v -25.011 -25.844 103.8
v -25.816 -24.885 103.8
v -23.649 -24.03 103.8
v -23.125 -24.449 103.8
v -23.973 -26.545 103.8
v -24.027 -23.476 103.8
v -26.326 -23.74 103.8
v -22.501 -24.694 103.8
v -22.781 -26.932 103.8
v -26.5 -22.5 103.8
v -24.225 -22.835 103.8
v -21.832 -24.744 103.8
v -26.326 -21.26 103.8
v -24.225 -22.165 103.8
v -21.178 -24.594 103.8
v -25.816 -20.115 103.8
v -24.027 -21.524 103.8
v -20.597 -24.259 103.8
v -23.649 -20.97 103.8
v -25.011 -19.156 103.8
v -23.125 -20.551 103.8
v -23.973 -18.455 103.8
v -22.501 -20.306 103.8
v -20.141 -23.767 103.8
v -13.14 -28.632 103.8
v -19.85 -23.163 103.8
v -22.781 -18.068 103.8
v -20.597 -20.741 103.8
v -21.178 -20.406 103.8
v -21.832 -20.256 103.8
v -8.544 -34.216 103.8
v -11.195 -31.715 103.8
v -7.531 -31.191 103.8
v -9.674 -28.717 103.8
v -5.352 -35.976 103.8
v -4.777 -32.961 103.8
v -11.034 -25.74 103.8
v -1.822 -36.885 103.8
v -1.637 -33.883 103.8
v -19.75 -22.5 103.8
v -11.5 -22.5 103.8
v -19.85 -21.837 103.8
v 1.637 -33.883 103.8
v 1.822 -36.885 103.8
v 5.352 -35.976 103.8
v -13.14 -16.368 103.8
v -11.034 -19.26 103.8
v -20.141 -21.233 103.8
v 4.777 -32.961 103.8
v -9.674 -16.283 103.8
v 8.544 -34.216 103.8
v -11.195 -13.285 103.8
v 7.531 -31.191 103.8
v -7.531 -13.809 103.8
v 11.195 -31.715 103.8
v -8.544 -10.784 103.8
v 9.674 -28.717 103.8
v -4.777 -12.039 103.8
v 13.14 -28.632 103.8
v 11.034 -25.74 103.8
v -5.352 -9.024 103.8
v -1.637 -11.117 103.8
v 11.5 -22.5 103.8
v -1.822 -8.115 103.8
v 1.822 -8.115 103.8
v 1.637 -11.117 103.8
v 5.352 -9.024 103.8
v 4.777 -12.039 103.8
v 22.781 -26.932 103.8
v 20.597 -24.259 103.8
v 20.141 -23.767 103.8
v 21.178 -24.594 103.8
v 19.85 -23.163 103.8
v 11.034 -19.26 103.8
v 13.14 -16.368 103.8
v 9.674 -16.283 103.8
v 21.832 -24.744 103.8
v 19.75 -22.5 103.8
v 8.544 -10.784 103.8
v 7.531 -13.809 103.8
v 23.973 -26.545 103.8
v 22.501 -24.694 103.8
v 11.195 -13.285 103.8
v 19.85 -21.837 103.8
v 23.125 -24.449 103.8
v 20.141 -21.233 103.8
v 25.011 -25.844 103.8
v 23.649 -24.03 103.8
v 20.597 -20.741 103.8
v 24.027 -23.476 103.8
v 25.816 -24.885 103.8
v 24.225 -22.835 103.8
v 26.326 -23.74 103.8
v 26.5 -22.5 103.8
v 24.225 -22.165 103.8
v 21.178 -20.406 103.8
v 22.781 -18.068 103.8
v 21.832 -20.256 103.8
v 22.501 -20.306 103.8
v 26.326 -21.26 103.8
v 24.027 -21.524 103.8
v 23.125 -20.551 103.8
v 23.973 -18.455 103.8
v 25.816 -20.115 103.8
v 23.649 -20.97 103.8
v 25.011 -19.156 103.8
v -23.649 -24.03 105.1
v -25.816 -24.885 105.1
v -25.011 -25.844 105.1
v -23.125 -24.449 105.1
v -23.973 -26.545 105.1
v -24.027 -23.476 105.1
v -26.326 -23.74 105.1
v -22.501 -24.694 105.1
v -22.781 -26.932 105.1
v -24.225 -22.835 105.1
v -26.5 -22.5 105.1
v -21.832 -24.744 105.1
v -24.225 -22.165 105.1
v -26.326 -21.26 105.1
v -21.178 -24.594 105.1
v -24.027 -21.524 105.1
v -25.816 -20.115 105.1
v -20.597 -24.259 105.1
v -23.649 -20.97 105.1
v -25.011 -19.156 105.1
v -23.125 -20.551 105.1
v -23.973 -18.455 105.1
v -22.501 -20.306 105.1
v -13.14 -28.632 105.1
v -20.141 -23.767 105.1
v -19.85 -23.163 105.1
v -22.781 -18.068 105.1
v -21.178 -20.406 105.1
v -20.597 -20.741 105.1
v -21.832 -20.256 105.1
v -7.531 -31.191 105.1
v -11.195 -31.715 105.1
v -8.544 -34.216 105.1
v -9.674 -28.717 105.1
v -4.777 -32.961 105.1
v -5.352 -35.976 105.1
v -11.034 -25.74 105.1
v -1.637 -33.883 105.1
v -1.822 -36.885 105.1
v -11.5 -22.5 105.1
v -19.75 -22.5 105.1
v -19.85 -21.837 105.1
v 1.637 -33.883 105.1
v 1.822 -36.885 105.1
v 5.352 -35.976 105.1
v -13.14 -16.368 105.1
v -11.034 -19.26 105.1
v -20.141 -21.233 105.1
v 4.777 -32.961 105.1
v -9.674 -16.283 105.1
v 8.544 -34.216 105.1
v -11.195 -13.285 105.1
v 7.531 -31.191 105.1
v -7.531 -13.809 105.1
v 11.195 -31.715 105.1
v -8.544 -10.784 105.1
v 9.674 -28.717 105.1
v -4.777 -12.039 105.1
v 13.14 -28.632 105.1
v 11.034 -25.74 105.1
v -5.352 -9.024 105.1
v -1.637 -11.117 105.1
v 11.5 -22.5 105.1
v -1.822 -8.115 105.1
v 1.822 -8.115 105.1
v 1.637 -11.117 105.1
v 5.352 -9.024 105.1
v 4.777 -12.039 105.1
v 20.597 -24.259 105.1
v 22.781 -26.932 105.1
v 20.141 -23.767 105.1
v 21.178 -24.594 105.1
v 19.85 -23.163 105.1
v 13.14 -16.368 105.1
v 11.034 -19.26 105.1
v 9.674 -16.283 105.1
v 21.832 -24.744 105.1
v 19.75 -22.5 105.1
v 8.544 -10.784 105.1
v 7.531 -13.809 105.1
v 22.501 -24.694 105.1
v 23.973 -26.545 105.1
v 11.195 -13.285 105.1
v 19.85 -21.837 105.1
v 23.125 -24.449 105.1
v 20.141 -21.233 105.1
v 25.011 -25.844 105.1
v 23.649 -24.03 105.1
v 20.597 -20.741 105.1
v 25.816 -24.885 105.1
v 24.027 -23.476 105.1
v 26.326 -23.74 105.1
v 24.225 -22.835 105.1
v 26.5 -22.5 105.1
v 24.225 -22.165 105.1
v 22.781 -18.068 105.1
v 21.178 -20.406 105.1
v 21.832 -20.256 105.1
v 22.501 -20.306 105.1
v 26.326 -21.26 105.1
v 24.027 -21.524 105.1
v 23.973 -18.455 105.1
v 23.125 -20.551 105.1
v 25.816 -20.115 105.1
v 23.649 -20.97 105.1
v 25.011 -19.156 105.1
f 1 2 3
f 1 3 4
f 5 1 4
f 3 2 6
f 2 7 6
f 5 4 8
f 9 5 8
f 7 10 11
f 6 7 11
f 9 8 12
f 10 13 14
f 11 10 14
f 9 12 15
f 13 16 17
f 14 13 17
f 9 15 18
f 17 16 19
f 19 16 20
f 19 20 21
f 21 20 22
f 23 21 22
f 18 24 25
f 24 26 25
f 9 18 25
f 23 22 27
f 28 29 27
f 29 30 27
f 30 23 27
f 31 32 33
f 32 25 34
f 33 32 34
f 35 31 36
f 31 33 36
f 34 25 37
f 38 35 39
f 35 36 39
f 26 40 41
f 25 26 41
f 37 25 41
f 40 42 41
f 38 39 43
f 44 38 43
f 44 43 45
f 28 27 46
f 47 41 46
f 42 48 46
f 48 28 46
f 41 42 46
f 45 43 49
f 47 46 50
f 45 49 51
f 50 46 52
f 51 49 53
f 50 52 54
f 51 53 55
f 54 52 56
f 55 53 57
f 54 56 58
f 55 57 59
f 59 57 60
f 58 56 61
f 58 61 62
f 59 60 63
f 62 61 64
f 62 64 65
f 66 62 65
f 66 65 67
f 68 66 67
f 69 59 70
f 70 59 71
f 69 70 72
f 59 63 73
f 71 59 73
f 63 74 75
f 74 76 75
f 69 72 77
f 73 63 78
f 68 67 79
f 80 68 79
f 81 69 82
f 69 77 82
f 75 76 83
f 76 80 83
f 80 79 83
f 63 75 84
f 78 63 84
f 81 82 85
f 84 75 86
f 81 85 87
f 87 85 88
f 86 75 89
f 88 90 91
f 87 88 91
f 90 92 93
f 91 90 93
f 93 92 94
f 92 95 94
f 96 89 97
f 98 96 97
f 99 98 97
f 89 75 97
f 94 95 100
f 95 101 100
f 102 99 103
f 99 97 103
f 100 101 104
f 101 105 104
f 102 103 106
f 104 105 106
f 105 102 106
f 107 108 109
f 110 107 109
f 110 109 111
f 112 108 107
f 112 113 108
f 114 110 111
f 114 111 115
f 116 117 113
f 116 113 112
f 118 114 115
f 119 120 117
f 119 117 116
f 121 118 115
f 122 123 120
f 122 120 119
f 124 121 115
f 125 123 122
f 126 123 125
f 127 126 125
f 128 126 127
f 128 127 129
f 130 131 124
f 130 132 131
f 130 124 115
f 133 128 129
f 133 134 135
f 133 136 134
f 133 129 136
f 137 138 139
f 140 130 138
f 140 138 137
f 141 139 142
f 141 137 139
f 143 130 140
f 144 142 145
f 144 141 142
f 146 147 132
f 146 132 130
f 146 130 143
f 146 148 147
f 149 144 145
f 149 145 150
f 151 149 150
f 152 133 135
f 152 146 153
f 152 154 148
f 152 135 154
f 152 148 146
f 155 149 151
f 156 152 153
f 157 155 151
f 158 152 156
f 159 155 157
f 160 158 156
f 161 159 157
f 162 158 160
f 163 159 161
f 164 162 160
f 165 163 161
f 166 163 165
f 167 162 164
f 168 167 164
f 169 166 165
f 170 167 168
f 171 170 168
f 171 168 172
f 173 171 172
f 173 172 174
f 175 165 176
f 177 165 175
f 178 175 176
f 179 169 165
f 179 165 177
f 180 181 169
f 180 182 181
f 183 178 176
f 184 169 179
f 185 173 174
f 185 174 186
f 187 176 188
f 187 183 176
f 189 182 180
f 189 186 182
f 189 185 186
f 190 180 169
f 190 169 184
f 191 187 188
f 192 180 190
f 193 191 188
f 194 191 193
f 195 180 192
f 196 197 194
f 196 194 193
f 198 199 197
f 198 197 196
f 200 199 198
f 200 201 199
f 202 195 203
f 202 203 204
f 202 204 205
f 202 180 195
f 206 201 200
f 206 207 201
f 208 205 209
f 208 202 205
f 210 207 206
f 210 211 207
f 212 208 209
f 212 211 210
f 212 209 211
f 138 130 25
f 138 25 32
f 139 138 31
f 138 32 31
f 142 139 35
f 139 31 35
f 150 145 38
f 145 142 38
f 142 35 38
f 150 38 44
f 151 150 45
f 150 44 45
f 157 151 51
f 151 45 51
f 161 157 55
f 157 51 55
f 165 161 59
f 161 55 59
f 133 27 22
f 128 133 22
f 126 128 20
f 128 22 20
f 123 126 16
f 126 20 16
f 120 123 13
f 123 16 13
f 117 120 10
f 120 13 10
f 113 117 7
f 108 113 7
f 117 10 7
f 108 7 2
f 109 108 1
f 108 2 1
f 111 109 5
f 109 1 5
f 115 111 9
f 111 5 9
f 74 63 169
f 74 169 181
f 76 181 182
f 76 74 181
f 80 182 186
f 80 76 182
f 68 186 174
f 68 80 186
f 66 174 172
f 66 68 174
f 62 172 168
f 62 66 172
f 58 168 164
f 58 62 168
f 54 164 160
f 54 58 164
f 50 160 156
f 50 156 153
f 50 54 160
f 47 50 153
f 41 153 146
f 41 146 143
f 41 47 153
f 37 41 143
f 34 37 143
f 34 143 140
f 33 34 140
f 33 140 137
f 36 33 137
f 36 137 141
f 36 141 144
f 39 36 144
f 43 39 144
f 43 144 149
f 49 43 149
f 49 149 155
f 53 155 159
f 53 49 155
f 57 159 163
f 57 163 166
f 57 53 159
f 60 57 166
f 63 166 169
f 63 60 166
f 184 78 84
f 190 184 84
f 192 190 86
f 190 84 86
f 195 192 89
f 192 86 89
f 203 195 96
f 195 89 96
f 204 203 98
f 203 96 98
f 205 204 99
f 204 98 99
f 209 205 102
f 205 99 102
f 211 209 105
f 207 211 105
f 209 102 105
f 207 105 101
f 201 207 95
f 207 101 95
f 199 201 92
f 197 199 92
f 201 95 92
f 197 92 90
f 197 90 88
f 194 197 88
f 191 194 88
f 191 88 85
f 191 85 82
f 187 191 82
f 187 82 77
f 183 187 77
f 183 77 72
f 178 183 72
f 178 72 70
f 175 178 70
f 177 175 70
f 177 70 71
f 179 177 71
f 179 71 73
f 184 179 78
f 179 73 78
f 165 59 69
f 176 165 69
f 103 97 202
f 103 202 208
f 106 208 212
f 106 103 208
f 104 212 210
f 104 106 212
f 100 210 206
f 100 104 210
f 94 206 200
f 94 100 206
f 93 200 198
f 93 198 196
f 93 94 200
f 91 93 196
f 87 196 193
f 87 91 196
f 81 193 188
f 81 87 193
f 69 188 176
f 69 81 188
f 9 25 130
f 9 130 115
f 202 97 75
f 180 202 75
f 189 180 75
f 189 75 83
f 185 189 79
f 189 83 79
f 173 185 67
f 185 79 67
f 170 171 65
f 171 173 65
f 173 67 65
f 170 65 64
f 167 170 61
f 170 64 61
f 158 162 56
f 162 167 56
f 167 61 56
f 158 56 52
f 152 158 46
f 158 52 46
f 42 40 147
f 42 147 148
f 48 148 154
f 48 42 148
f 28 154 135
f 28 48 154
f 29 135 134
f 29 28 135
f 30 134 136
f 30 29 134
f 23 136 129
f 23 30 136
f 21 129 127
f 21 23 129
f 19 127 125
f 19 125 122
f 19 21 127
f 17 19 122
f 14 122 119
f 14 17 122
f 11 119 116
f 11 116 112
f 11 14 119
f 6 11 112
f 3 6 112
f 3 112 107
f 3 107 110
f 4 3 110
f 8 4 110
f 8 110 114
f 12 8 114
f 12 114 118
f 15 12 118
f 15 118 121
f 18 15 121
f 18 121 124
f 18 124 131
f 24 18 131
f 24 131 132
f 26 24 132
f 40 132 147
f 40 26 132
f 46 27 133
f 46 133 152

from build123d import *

# Parameters (mm, degrees)
SKETCH044_R   = 14.5
SKETCH044_R_2 = 11.5
PAD026_DEPTH  = 1.3
SKETCH045_R   = 2.25
PAD027_DEPTH  = 1.3


with BuildPart() as part:
    # Sketch044 → Pad026 (new body)
    with BuildSketch(Plane.XY):
        Circle(SKETCH044_R)
        Circle(SKETCH044_R_2, mode=Mode.SUBTRACT)
    extrude(amount=PAD026_DEPTH)

    # Sketch045 → Pad027 (join)
    with BuildSketch(Plane.XY):
        with BuildLine():
            Line((-22.781417, 4.431635), (-12, 6.33269))
            Line((-12, 6.33269), (-12, -6.33269))
            Line((-12, -6.33269), (-22.781417, -4.431635))
            ThreePointArc((-22.781417, 4.431635), (-26.5, 0), (-22.781417, -4.431635))
        make_face()
        with Locations((-22, 0)):
            Circle(SKETCH045_R, mode=Mode.SUBTRACT)
    pad027 = extrude(amount=PAD027_DEPTH)

    # Mirrored003: Pad027 across Sketch045 V_Axis
    add(pad027.mirror(Plane(origin=(0, 0, 0), x_dir=(0, 0, 1), z_dir=(1, 0, 0))))


with BuildPart() as part_1:
    # Body026 placement: moved
    add(part.part.moved(Location((0, -22.5, 103.8))))


solid = part_1.part
